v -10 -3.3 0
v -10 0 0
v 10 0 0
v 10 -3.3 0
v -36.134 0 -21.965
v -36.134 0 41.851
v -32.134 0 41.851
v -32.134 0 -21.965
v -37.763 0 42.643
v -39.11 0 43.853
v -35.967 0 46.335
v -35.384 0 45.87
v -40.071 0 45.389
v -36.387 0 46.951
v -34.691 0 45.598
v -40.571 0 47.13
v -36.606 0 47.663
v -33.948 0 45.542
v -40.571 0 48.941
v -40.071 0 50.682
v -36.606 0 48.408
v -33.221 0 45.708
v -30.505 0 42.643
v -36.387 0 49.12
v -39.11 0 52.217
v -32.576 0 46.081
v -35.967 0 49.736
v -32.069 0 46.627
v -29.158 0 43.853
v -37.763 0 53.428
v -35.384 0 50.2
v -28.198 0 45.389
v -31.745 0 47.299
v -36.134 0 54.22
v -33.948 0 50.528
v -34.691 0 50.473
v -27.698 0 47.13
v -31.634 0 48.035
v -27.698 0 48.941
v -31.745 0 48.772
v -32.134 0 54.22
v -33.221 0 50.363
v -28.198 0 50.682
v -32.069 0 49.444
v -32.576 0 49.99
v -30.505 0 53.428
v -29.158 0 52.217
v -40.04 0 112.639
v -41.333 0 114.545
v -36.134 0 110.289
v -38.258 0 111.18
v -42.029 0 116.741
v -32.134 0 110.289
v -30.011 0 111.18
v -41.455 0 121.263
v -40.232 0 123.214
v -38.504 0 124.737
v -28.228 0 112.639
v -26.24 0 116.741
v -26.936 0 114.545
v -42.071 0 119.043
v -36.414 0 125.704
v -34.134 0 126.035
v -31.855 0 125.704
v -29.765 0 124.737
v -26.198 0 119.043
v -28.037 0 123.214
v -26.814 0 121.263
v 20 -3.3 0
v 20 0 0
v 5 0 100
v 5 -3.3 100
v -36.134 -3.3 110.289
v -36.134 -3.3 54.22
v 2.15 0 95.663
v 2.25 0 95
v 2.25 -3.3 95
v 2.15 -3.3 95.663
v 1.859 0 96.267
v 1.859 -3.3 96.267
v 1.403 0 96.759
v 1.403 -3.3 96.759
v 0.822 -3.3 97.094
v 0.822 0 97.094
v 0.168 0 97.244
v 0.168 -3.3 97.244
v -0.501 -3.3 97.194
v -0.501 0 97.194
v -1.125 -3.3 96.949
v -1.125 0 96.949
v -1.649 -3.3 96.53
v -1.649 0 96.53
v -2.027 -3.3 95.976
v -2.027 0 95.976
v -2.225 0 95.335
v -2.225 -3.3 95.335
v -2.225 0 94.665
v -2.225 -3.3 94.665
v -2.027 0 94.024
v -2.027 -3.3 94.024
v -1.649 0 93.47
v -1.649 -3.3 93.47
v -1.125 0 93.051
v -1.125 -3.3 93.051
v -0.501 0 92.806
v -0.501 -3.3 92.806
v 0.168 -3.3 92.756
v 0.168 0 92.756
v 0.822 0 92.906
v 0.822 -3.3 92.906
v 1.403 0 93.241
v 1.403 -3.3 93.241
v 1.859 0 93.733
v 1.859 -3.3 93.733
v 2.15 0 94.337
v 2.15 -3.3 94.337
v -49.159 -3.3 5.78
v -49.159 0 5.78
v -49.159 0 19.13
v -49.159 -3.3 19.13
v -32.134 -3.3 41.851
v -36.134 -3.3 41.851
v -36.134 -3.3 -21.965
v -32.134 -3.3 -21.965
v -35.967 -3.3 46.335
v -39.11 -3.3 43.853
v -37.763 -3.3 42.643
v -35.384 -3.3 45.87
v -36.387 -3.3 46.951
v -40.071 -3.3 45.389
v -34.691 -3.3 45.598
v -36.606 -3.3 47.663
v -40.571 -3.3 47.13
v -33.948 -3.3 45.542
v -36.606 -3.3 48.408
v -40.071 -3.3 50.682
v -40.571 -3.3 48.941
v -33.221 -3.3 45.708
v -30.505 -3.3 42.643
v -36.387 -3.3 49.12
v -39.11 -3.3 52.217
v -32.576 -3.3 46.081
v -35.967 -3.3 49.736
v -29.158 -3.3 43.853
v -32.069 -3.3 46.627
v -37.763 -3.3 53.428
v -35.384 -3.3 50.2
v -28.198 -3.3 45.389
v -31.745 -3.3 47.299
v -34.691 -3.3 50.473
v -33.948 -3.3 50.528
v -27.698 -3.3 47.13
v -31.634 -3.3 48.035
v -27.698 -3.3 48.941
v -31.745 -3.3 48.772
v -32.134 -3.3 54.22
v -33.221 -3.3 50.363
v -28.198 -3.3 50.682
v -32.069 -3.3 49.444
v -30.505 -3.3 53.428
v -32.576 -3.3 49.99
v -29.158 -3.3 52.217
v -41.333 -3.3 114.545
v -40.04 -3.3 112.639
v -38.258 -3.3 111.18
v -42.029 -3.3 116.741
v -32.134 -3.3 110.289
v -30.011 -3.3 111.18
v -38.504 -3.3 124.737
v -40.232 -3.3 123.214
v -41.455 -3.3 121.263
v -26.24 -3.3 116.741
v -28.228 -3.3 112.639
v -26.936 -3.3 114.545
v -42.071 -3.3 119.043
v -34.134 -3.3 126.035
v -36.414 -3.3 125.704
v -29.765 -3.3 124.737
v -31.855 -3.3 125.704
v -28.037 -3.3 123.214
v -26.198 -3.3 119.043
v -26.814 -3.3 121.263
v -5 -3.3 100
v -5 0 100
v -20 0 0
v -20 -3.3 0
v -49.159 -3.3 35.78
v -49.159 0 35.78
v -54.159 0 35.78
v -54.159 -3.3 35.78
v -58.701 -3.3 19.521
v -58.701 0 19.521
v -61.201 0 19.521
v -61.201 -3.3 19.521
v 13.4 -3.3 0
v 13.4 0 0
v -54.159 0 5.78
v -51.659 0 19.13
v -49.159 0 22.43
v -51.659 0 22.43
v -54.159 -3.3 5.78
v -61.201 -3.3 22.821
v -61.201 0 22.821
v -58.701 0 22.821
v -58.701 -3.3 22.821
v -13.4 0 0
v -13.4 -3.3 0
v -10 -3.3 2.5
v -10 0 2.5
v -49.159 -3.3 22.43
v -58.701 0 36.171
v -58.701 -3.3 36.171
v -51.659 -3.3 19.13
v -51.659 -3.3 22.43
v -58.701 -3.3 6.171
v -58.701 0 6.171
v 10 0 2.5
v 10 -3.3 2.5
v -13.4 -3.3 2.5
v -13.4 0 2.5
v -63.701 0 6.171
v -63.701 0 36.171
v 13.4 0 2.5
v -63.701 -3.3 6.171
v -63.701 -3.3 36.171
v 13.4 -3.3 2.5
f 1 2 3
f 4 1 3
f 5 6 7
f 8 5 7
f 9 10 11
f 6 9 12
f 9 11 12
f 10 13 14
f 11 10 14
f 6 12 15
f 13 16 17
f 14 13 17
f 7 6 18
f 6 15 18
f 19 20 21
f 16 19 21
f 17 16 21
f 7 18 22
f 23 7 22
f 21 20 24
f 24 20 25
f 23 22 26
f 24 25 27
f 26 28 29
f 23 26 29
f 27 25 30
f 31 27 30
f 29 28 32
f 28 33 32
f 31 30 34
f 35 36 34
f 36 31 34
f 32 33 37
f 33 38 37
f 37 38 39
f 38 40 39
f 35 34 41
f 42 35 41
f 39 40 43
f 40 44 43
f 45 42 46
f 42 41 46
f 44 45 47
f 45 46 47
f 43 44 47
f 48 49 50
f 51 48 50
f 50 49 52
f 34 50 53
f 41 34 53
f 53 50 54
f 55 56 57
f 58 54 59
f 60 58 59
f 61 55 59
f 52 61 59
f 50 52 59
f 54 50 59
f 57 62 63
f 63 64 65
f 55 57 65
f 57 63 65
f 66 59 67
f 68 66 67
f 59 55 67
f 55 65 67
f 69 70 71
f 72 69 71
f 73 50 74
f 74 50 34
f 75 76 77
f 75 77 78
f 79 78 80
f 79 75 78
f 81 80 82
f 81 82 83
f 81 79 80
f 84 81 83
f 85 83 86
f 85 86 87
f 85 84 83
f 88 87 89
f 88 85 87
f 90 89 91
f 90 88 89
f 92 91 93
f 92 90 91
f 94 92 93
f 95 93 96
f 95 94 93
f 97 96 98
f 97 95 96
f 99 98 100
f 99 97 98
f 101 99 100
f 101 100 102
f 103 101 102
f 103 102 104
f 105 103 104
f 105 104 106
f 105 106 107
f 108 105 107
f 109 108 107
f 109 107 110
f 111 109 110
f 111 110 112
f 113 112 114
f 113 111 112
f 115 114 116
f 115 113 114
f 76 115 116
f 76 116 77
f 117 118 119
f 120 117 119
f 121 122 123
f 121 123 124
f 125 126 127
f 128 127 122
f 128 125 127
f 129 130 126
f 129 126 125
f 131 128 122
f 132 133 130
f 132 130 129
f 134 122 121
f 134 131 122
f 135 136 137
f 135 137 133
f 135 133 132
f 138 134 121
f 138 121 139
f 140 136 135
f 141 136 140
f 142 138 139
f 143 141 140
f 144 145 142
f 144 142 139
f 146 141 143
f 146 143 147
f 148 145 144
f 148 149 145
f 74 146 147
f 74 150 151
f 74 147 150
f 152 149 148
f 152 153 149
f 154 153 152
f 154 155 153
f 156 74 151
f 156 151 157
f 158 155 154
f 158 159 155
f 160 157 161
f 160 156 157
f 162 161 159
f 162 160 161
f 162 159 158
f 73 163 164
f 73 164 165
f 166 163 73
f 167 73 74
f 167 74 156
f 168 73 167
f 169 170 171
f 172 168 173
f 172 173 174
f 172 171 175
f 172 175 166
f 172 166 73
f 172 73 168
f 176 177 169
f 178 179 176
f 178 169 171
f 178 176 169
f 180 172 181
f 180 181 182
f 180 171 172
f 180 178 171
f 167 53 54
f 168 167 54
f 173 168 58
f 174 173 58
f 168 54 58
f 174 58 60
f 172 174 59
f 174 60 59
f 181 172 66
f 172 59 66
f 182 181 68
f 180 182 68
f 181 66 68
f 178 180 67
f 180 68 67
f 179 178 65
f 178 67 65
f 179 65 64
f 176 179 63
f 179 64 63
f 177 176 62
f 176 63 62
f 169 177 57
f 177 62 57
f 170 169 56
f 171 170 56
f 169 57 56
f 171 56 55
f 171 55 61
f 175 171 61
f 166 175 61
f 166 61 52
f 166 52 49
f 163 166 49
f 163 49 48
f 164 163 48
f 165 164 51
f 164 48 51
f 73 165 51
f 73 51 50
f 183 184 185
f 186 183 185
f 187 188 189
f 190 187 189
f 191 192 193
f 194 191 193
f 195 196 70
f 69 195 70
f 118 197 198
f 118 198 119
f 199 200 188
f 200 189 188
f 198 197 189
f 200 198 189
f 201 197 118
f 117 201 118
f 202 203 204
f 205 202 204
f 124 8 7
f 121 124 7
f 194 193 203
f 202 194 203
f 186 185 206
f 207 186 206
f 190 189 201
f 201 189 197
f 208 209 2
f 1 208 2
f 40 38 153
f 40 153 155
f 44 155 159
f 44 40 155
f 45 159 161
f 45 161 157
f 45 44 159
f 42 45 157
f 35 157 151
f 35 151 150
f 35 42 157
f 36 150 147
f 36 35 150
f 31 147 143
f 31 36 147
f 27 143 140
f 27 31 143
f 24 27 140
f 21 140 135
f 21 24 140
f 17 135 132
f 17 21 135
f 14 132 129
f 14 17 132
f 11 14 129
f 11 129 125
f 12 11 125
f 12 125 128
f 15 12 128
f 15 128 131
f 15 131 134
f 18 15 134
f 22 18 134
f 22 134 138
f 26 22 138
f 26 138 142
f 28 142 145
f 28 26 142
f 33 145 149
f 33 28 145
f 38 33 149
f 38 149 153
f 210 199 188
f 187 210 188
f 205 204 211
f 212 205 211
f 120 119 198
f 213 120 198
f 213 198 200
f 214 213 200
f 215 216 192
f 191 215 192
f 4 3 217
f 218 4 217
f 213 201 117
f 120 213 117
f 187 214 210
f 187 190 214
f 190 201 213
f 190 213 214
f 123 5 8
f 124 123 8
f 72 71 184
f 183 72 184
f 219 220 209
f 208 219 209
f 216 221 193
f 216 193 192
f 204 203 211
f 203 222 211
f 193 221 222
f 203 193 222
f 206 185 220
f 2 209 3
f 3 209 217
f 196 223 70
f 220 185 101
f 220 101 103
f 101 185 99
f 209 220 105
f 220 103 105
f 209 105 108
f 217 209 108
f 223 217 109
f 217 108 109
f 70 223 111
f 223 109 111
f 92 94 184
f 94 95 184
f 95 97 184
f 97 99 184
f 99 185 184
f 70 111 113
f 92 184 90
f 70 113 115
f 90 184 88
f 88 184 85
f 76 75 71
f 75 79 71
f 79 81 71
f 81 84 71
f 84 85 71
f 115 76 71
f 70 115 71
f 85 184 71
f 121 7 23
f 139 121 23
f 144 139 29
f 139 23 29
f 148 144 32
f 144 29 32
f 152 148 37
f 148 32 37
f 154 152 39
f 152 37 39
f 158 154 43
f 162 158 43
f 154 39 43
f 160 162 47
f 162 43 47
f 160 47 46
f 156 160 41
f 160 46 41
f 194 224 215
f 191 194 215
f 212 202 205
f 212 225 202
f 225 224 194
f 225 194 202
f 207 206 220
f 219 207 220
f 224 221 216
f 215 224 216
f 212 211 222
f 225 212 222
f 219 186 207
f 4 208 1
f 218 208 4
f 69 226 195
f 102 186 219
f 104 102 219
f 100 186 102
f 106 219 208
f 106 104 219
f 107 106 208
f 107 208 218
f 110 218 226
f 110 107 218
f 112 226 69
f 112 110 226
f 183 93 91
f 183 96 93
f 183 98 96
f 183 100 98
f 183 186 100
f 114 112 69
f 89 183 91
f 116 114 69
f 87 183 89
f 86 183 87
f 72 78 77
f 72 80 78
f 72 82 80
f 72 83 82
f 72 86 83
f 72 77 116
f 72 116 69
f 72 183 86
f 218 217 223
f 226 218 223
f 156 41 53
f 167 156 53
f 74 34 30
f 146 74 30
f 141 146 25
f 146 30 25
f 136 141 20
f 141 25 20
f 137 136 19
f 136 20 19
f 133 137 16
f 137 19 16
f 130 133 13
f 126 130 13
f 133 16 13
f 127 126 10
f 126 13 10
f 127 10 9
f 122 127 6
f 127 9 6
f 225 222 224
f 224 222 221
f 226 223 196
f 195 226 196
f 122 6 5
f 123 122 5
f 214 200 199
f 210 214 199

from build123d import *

# Parameters (mm, degrees)
F0_R     = 2.25
F2_DEPTH = 3.3
F3_DEPTH = 3.3
F4_R     = 2.5
F5_DEPTH = 3.3


with BuildPart() as f2:
    # F0 (on Front) → F2 (new body)
    with BuildSketch(Plane.XZ):
        Polygon((-5, 100), (-20, 0), (-13.4, 0), (-13.4, 2.5), (-10, 2.5), (-10, 0), (10, 0), (10, 2.5), (13.4, 2.5), (13.4, 0), (20, 0), (5, 100), align=None)
        with Locations((0, 95)):
            Circle(F0_R, mode=Mode.SUBTRACT)
    extrude(amount=F2_DEPTH)


with BuildPart() as f3:
    # F1 (on Front) → F3 (new body)
    with BuildSketch(Plane.XZ):
        Polygon((-49.159433, 35.780251), (-54.159433, 35.780251), (-54.159433, 5.780251), (-49.159433, 5.780251), (-49.159433, 19.130251), (-51.659433, 19.130251), (-51.659433, 22.430251), (-49.159433, 22.430251), align=None)
        Polygon((-58.700869, 36.170656), (-63.700869, 36.170656), (-63.700869, 6.170656), (-58.700869, 6.170656), (-58.700869, 19.520656), (-61.200869, 19.520656), (-61.200869, 22.820656), (-58.700869, 22.820656), align=None)
    extrude(amount=F3_DEPTH)


with BuildPart() as f5:
    # F4 (on Front) → F5 (new body)
    with BuildSketch(Plane.XZ):
        with BuildLine():
            Line((-36.134413, 41.850759), (-36.134413, -21.964583))
            Line((-36.134413, -21.964583), (-32.134413, -21.964583))
            Line((-32.134413, -21.964583), (-32.134413, 41.850759))
            ThreePointArc((-32.134413, 41.850759), (-27.634413, 48.035417), (-32.134413, 54.220076))
            Line((-32.134413, 54.220076), (-32.134413, 110.289451))
            ThreePointArc((-32.134413, 110.289451), (-34.134413, 126.035417), (-36.134413, 110.289451))
            Line((-36.134413, 110.289451), (-36.134413, 54.220076))
            ThreePointArc((-36.134413, 54.220076), (-40.634413, 48.035417), (-36.134413, 41.850759))
        make_face()
        with Locations((-34.134413, 48.035417)):
            Circle(F4_R, mode=Mode.SUBTRACT)
    extrude(amount=F5_DEPTH)


solid = Compound([f2.part, f3.part, f5.part])
